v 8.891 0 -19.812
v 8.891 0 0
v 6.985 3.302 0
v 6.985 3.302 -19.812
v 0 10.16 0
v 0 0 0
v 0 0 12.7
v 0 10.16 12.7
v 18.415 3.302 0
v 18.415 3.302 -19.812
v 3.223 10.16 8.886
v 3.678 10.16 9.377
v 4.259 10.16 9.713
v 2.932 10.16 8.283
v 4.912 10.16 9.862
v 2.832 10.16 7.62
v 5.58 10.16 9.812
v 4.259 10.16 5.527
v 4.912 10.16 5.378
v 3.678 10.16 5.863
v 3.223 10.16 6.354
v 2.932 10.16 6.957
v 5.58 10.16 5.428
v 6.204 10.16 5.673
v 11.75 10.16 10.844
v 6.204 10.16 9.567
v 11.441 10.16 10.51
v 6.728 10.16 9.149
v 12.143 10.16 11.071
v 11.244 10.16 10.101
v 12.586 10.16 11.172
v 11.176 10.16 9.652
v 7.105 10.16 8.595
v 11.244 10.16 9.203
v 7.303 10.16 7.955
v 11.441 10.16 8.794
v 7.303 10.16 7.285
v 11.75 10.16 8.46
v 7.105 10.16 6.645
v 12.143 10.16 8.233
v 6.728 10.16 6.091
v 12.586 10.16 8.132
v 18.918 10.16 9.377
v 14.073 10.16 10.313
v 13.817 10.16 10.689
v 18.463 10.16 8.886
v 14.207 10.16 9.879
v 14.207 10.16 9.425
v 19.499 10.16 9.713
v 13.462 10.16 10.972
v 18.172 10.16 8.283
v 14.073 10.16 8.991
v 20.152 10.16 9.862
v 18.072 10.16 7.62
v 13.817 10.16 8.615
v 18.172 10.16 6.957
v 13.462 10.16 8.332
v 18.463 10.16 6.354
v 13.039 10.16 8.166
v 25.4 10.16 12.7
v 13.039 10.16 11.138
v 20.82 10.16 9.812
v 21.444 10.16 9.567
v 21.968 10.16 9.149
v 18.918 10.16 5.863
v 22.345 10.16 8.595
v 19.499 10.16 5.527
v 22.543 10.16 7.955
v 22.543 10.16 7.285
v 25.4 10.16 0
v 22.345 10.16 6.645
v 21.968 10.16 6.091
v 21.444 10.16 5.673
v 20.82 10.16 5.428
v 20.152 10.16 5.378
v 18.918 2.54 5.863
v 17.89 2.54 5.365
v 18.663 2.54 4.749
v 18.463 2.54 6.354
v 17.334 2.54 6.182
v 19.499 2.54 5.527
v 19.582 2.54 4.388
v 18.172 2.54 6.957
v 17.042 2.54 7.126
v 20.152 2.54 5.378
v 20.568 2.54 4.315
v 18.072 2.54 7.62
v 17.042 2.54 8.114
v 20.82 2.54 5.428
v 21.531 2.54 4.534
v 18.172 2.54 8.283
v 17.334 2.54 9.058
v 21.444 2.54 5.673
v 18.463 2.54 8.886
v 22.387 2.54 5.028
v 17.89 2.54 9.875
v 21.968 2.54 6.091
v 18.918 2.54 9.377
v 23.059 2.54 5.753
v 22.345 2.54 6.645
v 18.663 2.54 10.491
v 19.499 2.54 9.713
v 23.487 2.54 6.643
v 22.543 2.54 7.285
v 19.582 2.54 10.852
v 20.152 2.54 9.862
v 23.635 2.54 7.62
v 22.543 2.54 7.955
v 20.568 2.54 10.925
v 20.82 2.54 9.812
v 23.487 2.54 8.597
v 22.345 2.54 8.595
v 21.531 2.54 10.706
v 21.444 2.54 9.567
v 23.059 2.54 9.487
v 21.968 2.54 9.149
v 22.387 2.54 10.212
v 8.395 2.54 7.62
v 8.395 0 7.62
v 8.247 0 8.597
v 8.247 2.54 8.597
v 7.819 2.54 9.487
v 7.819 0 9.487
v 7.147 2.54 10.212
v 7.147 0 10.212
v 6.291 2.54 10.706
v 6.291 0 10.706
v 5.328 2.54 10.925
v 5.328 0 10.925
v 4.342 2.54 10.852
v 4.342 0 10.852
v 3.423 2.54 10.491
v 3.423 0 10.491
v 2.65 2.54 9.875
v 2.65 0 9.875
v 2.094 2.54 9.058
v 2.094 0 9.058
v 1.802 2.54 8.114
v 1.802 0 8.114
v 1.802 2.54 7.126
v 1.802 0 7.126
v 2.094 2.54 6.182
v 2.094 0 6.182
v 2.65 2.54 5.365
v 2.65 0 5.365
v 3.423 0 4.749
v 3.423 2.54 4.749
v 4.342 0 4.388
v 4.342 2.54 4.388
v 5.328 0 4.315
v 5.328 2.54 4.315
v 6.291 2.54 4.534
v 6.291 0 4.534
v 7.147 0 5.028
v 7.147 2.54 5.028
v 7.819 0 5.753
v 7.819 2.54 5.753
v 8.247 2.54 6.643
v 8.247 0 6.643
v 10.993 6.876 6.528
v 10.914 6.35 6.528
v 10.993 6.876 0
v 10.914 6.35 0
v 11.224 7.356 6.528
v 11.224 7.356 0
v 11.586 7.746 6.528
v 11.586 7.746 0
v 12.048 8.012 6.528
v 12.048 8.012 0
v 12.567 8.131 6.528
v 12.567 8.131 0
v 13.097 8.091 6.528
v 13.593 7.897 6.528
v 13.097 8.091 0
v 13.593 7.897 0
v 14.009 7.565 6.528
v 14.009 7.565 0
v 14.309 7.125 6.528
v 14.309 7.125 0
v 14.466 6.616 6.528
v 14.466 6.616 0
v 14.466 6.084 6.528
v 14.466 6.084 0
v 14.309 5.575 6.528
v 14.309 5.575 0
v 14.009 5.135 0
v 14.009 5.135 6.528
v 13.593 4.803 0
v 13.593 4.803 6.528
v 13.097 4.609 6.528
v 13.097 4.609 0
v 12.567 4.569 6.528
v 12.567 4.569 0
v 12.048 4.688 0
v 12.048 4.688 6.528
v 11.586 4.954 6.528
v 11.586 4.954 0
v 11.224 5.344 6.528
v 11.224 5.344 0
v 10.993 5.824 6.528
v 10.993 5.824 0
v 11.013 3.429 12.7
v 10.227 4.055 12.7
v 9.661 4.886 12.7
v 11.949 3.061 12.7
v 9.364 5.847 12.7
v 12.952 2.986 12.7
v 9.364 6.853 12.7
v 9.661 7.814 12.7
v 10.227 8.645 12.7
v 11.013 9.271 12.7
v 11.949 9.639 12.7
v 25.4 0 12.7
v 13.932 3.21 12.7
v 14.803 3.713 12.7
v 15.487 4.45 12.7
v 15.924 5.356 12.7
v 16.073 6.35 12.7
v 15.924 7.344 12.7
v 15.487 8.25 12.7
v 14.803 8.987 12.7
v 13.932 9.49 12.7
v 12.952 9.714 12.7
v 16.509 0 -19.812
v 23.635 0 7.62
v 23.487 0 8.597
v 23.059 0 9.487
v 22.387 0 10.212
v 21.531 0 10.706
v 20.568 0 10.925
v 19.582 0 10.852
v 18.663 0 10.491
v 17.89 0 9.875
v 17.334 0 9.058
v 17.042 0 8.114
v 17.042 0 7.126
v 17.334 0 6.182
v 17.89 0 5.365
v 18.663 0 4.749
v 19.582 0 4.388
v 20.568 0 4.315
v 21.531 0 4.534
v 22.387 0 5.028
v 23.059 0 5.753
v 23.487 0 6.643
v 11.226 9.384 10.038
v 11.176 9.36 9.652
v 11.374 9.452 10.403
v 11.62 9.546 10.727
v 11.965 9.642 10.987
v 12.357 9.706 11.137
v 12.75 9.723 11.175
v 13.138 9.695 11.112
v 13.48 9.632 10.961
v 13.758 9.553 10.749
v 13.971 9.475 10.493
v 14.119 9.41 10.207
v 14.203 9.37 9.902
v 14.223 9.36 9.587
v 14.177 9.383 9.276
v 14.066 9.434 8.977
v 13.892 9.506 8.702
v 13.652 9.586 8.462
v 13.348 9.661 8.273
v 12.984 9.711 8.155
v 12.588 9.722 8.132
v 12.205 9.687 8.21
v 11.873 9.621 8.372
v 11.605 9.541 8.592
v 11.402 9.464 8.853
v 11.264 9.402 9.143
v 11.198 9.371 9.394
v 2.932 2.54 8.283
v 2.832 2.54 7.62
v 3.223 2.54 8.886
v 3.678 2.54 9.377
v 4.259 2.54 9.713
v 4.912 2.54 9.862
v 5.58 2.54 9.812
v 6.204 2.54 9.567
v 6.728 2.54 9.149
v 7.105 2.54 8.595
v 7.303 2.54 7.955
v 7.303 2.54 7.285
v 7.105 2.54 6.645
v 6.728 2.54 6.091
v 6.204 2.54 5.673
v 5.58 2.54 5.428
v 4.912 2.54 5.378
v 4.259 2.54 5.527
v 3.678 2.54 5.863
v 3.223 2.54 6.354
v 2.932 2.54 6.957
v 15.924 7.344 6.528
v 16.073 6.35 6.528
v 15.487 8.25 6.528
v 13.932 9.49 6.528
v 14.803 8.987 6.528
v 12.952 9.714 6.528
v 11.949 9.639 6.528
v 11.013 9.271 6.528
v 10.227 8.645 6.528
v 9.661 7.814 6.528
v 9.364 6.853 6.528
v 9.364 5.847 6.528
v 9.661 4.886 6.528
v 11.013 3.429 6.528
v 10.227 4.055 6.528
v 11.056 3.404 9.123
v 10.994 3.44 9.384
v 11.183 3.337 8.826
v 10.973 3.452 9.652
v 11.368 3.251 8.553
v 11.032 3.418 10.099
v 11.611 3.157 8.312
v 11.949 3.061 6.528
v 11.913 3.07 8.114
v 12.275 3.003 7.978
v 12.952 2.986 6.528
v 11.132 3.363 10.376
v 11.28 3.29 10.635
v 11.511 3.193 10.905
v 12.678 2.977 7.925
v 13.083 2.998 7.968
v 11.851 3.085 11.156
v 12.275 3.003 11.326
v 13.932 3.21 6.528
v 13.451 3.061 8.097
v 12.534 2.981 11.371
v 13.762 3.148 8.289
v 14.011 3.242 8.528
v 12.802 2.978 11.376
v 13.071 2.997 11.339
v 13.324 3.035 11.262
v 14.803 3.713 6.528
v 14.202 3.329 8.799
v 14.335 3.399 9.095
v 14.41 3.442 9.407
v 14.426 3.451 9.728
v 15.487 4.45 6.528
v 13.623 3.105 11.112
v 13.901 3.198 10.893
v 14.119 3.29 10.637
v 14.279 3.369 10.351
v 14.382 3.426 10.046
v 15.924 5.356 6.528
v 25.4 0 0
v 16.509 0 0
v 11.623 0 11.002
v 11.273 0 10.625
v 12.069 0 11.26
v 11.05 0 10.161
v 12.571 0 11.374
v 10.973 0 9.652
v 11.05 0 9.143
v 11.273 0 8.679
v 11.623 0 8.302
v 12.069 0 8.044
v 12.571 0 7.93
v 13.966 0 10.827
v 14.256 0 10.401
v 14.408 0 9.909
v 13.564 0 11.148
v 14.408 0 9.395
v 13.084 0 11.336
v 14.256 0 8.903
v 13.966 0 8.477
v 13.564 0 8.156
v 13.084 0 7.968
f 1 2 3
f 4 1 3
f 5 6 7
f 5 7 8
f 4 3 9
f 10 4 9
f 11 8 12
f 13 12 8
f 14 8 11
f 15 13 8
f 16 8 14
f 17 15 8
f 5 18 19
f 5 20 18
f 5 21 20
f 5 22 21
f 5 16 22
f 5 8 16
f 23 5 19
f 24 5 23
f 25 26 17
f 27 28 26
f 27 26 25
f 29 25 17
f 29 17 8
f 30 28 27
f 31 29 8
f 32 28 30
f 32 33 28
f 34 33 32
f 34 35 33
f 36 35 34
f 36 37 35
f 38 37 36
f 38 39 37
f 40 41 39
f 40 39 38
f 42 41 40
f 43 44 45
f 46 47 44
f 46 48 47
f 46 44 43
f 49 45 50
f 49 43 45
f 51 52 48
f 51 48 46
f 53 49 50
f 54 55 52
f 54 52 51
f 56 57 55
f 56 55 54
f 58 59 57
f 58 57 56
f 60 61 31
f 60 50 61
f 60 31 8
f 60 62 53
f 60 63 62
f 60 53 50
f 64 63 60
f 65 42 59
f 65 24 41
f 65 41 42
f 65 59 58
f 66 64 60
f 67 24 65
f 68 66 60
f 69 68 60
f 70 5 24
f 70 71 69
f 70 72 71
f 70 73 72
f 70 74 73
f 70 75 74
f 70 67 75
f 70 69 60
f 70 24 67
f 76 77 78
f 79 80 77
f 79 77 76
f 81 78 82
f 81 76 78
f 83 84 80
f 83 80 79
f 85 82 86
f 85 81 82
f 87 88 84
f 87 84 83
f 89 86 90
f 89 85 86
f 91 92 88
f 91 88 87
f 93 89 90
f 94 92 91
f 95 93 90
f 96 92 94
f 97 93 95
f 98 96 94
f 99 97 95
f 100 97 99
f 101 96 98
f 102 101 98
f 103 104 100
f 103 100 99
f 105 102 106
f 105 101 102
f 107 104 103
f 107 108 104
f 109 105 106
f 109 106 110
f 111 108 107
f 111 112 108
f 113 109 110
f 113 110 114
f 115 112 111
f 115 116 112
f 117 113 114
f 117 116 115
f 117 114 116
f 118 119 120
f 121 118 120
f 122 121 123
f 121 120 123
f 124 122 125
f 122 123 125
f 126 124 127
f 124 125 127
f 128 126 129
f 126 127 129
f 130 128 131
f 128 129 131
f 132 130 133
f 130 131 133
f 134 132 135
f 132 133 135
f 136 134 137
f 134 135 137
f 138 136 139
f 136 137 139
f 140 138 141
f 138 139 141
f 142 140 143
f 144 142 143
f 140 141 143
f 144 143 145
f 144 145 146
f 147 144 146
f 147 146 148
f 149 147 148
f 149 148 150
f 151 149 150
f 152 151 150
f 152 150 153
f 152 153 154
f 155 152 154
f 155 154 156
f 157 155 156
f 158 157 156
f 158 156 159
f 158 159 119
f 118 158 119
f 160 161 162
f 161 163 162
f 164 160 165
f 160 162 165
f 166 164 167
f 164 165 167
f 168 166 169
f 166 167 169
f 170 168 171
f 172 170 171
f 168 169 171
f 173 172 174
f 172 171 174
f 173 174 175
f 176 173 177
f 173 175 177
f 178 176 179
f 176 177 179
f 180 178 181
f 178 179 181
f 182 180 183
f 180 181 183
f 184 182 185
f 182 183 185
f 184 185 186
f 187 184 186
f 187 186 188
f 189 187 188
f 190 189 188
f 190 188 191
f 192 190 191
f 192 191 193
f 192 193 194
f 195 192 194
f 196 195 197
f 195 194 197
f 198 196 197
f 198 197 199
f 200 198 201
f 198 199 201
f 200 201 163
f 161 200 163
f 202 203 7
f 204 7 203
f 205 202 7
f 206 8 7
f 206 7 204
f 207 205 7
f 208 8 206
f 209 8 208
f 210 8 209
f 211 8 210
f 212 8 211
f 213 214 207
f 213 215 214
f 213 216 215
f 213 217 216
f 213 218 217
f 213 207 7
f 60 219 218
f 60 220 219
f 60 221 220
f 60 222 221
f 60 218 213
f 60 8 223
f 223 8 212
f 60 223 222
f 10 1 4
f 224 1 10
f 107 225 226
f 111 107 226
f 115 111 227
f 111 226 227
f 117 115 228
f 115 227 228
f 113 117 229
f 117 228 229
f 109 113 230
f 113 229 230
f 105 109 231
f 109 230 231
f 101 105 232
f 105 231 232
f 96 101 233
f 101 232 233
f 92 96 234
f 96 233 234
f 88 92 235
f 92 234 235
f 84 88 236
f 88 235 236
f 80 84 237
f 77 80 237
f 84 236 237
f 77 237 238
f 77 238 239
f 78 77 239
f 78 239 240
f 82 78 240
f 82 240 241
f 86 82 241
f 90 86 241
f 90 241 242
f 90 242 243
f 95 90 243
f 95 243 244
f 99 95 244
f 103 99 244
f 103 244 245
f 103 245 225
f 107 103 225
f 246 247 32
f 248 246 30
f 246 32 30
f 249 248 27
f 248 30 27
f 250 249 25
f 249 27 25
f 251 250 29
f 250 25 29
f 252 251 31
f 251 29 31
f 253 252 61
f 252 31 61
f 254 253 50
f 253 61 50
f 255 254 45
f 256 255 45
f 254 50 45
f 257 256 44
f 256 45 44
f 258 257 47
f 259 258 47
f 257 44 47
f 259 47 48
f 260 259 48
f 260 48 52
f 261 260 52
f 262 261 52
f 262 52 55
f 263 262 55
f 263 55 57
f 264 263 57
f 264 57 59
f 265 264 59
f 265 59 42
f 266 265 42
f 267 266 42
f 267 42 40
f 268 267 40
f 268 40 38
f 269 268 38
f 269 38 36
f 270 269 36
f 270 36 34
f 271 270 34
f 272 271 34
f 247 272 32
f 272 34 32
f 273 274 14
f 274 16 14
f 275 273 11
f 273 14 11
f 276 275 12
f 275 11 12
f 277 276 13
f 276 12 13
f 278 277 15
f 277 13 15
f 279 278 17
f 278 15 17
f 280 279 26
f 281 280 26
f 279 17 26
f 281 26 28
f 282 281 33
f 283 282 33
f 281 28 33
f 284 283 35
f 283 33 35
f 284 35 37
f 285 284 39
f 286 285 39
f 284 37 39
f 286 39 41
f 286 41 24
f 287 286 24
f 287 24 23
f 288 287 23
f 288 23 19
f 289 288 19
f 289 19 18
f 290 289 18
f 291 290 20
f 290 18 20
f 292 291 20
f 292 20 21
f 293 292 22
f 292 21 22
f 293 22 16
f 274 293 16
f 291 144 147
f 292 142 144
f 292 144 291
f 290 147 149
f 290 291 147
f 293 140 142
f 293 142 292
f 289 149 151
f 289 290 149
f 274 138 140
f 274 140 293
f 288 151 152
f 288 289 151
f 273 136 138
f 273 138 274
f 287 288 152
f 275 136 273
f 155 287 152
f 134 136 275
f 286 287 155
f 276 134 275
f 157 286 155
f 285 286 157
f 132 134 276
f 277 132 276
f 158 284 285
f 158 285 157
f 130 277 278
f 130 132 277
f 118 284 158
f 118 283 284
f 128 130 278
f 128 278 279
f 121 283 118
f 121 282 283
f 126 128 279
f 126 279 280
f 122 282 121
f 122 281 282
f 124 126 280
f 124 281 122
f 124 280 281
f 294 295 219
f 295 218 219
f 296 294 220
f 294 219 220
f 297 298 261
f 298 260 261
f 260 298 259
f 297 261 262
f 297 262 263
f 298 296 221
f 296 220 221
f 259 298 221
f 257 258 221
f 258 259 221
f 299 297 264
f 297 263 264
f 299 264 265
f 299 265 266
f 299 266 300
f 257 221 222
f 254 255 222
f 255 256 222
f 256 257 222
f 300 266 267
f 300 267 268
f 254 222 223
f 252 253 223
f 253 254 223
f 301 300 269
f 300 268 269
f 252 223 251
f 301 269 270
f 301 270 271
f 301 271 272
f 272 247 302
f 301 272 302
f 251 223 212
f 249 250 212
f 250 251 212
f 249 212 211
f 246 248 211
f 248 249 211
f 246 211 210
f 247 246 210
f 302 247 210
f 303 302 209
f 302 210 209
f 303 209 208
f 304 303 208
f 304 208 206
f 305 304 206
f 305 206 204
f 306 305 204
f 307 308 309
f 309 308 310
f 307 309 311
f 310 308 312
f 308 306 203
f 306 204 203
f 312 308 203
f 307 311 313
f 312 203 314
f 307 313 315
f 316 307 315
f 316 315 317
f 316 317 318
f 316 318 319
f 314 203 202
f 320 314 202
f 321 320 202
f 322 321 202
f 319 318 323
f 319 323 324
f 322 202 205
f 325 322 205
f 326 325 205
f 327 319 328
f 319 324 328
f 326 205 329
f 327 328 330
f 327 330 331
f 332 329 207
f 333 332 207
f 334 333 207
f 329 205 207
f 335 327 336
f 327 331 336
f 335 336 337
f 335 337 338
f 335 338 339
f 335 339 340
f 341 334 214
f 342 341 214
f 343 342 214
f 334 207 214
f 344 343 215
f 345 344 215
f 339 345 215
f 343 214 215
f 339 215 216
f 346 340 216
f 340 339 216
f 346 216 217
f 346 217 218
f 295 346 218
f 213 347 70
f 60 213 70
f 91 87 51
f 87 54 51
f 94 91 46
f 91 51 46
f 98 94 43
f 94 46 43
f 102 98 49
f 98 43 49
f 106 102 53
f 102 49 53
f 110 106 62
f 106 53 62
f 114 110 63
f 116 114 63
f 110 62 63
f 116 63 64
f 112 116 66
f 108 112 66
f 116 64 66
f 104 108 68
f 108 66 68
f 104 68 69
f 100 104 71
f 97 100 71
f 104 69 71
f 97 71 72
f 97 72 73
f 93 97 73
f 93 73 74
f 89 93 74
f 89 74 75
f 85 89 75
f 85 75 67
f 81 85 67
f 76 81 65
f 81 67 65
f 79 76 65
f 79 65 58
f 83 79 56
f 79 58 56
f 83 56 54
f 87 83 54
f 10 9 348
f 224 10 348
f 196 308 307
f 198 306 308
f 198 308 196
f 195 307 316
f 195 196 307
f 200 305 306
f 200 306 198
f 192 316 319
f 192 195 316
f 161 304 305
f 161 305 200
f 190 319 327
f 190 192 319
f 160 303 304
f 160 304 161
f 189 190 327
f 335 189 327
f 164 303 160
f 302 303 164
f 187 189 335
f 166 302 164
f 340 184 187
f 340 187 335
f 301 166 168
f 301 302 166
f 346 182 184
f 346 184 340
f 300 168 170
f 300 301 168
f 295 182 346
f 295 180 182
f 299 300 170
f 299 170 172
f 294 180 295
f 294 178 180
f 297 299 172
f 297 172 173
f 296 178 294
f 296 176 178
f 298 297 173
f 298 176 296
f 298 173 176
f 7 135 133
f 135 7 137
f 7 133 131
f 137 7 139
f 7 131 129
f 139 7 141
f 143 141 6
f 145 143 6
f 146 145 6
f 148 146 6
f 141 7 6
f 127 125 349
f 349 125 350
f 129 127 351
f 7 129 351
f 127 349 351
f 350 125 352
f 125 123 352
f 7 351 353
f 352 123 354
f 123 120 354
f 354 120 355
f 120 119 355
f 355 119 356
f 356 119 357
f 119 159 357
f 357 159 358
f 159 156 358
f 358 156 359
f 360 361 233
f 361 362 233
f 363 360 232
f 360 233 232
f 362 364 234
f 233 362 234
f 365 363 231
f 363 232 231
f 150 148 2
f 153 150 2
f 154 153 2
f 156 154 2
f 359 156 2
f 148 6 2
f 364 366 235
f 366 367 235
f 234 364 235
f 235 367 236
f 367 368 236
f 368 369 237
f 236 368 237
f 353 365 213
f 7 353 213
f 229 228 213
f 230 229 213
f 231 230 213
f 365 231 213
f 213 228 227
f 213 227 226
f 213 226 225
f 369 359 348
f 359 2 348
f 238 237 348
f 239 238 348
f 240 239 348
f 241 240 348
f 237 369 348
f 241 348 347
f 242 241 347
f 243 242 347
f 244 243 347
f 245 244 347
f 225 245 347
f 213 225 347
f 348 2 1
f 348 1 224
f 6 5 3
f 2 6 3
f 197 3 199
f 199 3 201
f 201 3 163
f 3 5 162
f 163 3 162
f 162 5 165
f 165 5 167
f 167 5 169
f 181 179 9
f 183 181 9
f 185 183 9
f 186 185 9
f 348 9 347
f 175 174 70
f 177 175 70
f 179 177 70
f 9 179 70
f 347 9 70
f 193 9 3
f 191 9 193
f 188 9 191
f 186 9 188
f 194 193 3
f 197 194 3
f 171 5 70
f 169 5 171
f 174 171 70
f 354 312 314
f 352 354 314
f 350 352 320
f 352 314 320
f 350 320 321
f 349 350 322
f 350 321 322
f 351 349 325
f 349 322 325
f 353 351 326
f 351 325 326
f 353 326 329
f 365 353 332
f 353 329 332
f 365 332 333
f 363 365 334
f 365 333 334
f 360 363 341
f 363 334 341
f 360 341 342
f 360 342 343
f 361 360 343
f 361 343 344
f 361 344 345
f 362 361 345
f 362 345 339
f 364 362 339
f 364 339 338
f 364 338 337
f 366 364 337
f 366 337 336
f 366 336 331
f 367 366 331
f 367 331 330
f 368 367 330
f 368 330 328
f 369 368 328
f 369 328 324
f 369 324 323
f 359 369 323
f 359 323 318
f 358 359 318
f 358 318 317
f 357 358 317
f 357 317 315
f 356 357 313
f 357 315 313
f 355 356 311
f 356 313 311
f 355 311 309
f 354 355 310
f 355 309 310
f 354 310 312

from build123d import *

# Parameters (mm, degrees)
F0_W           = 25.4
F0_H           = 10.16
F1_DEPTH       = 12.7
F3_DEPTH       = 19.812
F5_D           = 4.4958
F5_CBORE_D     = 6.6294
F5_CBORE_DEPTH = 2.54
F7_D           = 3.571875
F7_CBORE_D     = 6.746875
F7_CBORE_DEPTH = 6.1722
F8_D           = 3.4544
F8_DEPTH       = 6.35
F8_TIP         = 1.0378064612
F9_D           = 3.048


with BuildPart() as f1:
    # F0 (on Top) → F1 (new body)
    with BuildSketch(Plane.XY):
        with Locations((12.7, 5.08)):
            Rectangle(F0_W, F0_H)
    extrude(amount=F1_DEPTH)

    # F2 (on face) → F3 (join)
    with BuildSketch(Plane(origin=(0, 0, 0), x_dir=(1, 0, 0), z_dir=(0, 0, -1))):
        Polygon((8.8914105889, 0), (6.985, -3.302), (18.415, -3.302), (16.5085894111, 0), align=None)
    extrude(amount=F3_DEPTH)

    # F5 (through all)
    with Locations(Plane.XZ):
        with Locations((5.08, 7.62), (20.32, 7.62)):
            CounterBoreHole(F5_D / 2, F5_CBORE_D / 2, F5_CBORE_DEPTH)

    # F7 (through all)
    with Locations(Plane.XY.offset(12.7)):
        with Locations((12.7, 6.35)):
            CounterBoreHole(F7_D / 2, F7_CBORE_D / 2, F7_CBORE_DEPTH)

    # F8
    with Locations(Plane.XZ):
        with Locations((12.7, 9.652)):
            Hole(F8_D / 2, depth=F8_DEPTH)
            with Locations((0, 0, -(F8_DEPTH + F8_TIP / 2))):  # 118° drill point
                Cone(0, F8_D / 2, F8_TIP, mode=Mode.SUBTRACT)

    # F9 (through all)
    with Locations(Plane.XZ):
        with Locations((12.7, 9.652)):
            Hole(F9_D / 2)


solid = f1.part
